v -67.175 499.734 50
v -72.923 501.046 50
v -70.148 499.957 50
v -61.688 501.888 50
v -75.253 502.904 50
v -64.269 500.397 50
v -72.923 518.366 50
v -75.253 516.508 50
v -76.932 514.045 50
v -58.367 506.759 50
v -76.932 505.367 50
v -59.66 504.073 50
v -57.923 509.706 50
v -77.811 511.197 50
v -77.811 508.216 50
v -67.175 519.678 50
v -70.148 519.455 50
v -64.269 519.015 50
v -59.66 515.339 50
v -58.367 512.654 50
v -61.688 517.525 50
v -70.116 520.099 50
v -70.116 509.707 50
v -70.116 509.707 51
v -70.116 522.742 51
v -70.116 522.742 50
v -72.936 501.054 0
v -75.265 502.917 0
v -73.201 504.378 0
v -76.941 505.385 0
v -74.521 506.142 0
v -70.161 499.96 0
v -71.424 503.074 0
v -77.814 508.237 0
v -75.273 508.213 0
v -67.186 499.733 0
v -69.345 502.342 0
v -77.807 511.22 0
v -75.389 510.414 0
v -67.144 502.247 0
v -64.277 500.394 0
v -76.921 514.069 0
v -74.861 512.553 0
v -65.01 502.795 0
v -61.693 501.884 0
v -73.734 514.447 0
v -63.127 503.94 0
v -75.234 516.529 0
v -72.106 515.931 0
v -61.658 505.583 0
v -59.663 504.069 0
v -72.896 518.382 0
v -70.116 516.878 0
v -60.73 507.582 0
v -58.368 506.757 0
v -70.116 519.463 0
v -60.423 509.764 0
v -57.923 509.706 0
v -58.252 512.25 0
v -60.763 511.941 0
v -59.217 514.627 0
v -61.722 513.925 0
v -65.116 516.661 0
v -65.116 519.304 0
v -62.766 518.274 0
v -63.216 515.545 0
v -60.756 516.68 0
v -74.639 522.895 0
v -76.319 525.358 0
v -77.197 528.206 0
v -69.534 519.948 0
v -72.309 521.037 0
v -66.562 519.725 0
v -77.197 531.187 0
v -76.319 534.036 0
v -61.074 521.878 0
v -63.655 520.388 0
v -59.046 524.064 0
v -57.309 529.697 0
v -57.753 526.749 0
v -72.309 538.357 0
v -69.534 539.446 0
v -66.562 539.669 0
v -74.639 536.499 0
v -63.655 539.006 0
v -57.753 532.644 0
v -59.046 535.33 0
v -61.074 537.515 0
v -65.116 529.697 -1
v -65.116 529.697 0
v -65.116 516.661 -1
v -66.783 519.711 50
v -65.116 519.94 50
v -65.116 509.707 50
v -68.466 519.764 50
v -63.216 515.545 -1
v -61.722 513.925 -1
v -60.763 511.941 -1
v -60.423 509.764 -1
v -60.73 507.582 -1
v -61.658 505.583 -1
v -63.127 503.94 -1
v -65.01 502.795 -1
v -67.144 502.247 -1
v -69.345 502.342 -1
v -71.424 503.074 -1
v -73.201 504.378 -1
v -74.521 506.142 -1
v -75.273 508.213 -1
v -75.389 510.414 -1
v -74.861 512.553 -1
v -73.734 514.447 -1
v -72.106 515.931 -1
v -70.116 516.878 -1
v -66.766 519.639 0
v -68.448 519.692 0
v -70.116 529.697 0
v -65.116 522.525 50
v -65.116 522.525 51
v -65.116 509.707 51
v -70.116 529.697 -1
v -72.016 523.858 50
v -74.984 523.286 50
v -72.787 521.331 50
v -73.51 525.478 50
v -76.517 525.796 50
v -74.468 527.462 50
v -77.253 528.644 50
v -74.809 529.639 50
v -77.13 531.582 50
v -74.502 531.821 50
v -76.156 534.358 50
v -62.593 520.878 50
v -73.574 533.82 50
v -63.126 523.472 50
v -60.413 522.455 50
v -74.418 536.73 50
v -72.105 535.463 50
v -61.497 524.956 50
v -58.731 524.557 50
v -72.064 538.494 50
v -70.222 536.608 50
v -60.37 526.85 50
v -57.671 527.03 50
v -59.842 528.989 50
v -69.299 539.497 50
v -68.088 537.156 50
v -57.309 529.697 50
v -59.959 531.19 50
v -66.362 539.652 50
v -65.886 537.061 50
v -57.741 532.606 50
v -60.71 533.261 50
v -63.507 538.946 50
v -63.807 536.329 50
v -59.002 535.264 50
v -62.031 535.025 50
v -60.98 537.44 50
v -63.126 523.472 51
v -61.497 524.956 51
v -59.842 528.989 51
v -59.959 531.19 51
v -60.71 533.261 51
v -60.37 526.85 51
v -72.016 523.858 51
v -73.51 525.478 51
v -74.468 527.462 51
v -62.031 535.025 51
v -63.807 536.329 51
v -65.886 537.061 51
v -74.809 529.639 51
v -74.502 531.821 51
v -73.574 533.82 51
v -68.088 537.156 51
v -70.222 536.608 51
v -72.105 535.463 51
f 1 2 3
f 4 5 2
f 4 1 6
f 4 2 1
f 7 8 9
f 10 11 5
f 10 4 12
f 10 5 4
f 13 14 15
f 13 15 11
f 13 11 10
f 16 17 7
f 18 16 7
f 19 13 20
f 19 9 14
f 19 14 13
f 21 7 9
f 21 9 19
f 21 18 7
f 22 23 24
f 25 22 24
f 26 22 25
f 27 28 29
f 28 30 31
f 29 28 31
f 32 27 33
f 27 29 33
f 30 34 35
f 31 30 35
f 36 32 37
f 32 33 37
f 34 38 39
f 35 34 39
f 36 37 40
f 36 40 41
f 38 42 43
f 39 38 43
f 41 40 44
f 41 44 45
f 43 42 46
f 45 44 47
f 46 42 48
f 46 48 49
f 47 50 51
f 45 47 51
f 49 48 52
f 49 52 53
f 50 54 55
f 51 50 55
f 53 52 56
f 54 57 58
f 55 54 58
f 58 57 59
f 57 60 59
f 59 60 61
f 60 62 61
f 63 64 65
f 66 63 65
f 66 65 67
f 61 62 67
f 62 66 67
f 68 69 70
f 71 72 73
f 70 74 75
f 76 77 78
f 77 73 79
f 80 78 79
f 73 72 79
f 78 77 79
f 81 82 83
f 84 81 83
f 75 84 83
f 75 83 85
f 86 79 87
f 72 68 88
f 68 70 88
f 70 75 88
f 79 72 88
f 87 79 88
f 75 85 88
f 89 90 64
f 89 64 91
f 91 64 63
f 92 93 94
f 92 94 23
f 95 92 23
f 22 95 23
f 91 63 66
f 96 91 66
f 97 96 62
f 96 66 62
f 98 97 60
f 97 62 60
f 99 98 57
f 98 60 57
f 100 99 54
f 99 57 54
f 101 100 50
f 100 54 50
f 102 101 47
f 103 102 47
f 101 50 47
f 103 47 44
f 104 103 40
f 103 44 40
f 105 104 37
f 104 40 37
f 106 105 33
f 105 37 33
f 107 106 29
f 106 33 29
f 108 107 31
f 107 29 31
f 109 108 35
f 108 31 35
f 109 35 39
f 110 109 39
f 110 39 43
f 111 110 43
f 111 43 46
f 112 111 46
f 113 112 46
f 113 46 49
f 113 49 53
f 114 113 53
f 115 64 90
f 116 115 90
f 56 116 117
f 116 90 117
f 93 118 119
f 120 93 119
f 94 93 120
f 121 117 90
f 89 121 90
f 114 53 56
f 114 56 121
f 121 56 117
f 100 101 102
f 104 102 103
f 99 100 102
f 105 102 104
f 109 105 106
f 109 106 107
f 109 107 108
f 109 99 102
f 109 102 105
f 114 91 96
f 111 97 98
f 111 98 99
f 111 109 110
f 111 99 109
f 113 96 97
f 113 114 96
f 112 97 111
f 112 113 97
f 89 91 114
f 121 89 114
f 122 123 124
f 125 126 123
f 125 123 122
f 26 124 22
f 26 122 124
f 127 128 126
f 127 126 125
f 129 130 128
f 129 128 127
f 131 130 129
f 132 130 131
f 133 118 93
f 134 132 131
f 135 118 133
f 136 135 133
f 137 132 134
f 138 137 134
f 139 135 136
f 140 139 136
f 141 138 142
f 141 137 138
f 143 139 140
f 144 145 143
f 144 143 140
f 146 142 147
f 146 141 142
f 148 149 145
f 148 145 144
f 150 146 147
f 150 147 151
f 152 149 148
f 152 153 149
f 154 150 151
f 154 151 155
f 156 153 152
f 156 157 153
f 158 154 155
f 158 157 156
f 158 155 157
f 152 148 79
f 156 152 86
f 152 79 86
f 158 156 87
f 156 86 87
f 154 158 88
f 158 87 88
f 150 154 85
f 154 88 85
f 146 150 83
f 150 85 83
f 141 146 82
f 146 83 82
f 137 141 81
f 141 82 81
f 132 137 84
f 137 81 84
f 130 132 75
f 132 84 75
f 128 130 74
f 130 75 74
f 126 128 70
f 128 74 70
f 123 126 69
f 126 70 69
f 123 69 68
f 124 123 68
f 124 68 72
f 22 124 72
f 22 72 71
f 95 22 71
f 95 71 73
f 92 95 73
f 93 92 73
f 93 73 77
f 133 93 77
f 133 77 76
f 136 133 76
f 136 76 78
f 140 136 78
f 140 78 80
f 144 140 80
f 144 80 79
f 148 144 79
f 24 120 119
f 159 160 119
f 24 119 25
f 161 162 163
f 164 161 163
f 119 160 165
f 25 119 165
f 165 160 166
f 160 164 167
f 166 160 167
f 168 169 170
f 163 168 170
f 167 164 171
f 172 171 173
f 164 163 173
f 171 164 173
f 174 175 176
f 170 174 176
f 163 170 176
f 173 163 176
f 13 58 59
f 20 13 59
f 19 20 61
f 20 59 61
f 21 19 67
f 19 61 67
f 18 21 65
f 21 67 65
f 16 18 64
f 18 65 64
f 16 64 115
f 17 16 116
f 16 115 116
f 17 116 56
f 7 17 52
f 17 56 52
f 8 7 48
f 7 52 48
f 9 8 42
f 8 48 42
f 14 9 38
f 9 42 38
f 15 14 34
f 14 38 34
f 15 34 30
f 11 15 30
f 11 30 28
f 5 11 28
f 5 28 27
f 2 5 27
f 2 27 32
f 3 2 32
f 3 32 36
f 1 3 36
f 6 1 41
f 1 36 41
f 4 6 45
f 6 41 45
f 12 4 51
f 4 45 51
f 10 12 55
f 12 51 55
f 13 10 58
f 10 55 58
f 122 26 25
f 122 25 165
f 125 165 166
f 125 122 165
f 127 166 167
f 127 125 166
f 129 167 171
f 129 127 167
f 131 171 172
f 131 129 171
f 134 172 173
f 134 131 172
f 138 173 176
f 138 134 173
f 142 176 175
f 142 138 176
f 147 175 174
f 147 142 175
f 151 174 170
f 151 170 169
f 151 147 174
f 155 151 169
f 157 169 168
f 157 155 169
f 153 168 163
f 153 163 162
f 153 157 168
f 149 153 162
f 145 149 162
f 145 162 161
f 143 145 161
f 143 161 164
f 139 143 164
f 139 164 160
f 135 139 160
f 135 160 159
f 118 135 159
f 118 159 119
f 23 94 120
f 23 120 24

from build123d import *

# Parameters (mm, degrees)
ESBO_O1_R                  = 10
RESSALTO_EXTRUS_O1_DEPTH   = 50
RESSALTO_EXTRUS_O1_2_DEPTH = 50
RESSALTO_EXTRUS_O2_DEPTH   = 1
RESSALTO_EXTRUS_O3_DEPTH   = 1


with BuildPart() as part:
    # Esboço1 → Ressalto-extrusão1 (new body)
    with BuildSketch(Plane.XY):
        with Locations((-67.308878825, 529.696792621)):
            Circle(ESBO_O1_R)
    extrude(amount=RESSALTO_EXTRUS_O1_DEPTH)

    # Esboço2 → Ressalto-extrusão2 (add)
    with BuildSketch(Plane.XY.offset(50)):
        with BuildLine():
            Line((-65.115771676, 522.524604598), (-65.115771676, 509.706502891))
            Line((-65.115771676, 509.706502891), (-70.115771676, 509.706502891))
            Line((-70.115771676, 509.706502891), (-70.115771676, 522.741840965))
            ThreePointArc((-70.115771676, 522.741840965), (-66.983331391, 537.189723881), (-65.115771676, 522.524604598))
        make_face()
    extrude(amount=RESSALTO_EXTRUS_O2_DEPTH)


with BuildPart() as body_2:
    # Esboço1 → Ressalto-extrus_o1 2 (new body)
    with BuildSketch(Plane.XY):
        with Locations((-67.922664527, 509.706213161)):
            Circle(ESBO_O1_R)
    extrude(amount=RESSALTO_EXTRUS_O1_2_DEPTH)

    # Esboço3 → Ressalto-extrusão3 (add)
    with BuildSketch(Plane(origin=(0, 0, 0), x_dir=(-1, 0, 0), z_dir=(0, 0, -1))):
        with BuildLine():
            Line((70.115771676, 516.878401184), (70.115771676, 529.696502891))
            Line((70.115771676, 529.696502891), (65.115771676, 529.696502891))
            Line((65.115771676, 529.696502891), (65.115771676, 516.661164816))
            ThreePointArc((65.115771676, 516.661164816), (68.248211961, 502.213281901), (70.115771676, 516.878401184))
        make_face()
    extrude(amount=RESSALTO_EXTRUS_O3_DEPTH)


solid = Compound([part.part, body_2.part])
